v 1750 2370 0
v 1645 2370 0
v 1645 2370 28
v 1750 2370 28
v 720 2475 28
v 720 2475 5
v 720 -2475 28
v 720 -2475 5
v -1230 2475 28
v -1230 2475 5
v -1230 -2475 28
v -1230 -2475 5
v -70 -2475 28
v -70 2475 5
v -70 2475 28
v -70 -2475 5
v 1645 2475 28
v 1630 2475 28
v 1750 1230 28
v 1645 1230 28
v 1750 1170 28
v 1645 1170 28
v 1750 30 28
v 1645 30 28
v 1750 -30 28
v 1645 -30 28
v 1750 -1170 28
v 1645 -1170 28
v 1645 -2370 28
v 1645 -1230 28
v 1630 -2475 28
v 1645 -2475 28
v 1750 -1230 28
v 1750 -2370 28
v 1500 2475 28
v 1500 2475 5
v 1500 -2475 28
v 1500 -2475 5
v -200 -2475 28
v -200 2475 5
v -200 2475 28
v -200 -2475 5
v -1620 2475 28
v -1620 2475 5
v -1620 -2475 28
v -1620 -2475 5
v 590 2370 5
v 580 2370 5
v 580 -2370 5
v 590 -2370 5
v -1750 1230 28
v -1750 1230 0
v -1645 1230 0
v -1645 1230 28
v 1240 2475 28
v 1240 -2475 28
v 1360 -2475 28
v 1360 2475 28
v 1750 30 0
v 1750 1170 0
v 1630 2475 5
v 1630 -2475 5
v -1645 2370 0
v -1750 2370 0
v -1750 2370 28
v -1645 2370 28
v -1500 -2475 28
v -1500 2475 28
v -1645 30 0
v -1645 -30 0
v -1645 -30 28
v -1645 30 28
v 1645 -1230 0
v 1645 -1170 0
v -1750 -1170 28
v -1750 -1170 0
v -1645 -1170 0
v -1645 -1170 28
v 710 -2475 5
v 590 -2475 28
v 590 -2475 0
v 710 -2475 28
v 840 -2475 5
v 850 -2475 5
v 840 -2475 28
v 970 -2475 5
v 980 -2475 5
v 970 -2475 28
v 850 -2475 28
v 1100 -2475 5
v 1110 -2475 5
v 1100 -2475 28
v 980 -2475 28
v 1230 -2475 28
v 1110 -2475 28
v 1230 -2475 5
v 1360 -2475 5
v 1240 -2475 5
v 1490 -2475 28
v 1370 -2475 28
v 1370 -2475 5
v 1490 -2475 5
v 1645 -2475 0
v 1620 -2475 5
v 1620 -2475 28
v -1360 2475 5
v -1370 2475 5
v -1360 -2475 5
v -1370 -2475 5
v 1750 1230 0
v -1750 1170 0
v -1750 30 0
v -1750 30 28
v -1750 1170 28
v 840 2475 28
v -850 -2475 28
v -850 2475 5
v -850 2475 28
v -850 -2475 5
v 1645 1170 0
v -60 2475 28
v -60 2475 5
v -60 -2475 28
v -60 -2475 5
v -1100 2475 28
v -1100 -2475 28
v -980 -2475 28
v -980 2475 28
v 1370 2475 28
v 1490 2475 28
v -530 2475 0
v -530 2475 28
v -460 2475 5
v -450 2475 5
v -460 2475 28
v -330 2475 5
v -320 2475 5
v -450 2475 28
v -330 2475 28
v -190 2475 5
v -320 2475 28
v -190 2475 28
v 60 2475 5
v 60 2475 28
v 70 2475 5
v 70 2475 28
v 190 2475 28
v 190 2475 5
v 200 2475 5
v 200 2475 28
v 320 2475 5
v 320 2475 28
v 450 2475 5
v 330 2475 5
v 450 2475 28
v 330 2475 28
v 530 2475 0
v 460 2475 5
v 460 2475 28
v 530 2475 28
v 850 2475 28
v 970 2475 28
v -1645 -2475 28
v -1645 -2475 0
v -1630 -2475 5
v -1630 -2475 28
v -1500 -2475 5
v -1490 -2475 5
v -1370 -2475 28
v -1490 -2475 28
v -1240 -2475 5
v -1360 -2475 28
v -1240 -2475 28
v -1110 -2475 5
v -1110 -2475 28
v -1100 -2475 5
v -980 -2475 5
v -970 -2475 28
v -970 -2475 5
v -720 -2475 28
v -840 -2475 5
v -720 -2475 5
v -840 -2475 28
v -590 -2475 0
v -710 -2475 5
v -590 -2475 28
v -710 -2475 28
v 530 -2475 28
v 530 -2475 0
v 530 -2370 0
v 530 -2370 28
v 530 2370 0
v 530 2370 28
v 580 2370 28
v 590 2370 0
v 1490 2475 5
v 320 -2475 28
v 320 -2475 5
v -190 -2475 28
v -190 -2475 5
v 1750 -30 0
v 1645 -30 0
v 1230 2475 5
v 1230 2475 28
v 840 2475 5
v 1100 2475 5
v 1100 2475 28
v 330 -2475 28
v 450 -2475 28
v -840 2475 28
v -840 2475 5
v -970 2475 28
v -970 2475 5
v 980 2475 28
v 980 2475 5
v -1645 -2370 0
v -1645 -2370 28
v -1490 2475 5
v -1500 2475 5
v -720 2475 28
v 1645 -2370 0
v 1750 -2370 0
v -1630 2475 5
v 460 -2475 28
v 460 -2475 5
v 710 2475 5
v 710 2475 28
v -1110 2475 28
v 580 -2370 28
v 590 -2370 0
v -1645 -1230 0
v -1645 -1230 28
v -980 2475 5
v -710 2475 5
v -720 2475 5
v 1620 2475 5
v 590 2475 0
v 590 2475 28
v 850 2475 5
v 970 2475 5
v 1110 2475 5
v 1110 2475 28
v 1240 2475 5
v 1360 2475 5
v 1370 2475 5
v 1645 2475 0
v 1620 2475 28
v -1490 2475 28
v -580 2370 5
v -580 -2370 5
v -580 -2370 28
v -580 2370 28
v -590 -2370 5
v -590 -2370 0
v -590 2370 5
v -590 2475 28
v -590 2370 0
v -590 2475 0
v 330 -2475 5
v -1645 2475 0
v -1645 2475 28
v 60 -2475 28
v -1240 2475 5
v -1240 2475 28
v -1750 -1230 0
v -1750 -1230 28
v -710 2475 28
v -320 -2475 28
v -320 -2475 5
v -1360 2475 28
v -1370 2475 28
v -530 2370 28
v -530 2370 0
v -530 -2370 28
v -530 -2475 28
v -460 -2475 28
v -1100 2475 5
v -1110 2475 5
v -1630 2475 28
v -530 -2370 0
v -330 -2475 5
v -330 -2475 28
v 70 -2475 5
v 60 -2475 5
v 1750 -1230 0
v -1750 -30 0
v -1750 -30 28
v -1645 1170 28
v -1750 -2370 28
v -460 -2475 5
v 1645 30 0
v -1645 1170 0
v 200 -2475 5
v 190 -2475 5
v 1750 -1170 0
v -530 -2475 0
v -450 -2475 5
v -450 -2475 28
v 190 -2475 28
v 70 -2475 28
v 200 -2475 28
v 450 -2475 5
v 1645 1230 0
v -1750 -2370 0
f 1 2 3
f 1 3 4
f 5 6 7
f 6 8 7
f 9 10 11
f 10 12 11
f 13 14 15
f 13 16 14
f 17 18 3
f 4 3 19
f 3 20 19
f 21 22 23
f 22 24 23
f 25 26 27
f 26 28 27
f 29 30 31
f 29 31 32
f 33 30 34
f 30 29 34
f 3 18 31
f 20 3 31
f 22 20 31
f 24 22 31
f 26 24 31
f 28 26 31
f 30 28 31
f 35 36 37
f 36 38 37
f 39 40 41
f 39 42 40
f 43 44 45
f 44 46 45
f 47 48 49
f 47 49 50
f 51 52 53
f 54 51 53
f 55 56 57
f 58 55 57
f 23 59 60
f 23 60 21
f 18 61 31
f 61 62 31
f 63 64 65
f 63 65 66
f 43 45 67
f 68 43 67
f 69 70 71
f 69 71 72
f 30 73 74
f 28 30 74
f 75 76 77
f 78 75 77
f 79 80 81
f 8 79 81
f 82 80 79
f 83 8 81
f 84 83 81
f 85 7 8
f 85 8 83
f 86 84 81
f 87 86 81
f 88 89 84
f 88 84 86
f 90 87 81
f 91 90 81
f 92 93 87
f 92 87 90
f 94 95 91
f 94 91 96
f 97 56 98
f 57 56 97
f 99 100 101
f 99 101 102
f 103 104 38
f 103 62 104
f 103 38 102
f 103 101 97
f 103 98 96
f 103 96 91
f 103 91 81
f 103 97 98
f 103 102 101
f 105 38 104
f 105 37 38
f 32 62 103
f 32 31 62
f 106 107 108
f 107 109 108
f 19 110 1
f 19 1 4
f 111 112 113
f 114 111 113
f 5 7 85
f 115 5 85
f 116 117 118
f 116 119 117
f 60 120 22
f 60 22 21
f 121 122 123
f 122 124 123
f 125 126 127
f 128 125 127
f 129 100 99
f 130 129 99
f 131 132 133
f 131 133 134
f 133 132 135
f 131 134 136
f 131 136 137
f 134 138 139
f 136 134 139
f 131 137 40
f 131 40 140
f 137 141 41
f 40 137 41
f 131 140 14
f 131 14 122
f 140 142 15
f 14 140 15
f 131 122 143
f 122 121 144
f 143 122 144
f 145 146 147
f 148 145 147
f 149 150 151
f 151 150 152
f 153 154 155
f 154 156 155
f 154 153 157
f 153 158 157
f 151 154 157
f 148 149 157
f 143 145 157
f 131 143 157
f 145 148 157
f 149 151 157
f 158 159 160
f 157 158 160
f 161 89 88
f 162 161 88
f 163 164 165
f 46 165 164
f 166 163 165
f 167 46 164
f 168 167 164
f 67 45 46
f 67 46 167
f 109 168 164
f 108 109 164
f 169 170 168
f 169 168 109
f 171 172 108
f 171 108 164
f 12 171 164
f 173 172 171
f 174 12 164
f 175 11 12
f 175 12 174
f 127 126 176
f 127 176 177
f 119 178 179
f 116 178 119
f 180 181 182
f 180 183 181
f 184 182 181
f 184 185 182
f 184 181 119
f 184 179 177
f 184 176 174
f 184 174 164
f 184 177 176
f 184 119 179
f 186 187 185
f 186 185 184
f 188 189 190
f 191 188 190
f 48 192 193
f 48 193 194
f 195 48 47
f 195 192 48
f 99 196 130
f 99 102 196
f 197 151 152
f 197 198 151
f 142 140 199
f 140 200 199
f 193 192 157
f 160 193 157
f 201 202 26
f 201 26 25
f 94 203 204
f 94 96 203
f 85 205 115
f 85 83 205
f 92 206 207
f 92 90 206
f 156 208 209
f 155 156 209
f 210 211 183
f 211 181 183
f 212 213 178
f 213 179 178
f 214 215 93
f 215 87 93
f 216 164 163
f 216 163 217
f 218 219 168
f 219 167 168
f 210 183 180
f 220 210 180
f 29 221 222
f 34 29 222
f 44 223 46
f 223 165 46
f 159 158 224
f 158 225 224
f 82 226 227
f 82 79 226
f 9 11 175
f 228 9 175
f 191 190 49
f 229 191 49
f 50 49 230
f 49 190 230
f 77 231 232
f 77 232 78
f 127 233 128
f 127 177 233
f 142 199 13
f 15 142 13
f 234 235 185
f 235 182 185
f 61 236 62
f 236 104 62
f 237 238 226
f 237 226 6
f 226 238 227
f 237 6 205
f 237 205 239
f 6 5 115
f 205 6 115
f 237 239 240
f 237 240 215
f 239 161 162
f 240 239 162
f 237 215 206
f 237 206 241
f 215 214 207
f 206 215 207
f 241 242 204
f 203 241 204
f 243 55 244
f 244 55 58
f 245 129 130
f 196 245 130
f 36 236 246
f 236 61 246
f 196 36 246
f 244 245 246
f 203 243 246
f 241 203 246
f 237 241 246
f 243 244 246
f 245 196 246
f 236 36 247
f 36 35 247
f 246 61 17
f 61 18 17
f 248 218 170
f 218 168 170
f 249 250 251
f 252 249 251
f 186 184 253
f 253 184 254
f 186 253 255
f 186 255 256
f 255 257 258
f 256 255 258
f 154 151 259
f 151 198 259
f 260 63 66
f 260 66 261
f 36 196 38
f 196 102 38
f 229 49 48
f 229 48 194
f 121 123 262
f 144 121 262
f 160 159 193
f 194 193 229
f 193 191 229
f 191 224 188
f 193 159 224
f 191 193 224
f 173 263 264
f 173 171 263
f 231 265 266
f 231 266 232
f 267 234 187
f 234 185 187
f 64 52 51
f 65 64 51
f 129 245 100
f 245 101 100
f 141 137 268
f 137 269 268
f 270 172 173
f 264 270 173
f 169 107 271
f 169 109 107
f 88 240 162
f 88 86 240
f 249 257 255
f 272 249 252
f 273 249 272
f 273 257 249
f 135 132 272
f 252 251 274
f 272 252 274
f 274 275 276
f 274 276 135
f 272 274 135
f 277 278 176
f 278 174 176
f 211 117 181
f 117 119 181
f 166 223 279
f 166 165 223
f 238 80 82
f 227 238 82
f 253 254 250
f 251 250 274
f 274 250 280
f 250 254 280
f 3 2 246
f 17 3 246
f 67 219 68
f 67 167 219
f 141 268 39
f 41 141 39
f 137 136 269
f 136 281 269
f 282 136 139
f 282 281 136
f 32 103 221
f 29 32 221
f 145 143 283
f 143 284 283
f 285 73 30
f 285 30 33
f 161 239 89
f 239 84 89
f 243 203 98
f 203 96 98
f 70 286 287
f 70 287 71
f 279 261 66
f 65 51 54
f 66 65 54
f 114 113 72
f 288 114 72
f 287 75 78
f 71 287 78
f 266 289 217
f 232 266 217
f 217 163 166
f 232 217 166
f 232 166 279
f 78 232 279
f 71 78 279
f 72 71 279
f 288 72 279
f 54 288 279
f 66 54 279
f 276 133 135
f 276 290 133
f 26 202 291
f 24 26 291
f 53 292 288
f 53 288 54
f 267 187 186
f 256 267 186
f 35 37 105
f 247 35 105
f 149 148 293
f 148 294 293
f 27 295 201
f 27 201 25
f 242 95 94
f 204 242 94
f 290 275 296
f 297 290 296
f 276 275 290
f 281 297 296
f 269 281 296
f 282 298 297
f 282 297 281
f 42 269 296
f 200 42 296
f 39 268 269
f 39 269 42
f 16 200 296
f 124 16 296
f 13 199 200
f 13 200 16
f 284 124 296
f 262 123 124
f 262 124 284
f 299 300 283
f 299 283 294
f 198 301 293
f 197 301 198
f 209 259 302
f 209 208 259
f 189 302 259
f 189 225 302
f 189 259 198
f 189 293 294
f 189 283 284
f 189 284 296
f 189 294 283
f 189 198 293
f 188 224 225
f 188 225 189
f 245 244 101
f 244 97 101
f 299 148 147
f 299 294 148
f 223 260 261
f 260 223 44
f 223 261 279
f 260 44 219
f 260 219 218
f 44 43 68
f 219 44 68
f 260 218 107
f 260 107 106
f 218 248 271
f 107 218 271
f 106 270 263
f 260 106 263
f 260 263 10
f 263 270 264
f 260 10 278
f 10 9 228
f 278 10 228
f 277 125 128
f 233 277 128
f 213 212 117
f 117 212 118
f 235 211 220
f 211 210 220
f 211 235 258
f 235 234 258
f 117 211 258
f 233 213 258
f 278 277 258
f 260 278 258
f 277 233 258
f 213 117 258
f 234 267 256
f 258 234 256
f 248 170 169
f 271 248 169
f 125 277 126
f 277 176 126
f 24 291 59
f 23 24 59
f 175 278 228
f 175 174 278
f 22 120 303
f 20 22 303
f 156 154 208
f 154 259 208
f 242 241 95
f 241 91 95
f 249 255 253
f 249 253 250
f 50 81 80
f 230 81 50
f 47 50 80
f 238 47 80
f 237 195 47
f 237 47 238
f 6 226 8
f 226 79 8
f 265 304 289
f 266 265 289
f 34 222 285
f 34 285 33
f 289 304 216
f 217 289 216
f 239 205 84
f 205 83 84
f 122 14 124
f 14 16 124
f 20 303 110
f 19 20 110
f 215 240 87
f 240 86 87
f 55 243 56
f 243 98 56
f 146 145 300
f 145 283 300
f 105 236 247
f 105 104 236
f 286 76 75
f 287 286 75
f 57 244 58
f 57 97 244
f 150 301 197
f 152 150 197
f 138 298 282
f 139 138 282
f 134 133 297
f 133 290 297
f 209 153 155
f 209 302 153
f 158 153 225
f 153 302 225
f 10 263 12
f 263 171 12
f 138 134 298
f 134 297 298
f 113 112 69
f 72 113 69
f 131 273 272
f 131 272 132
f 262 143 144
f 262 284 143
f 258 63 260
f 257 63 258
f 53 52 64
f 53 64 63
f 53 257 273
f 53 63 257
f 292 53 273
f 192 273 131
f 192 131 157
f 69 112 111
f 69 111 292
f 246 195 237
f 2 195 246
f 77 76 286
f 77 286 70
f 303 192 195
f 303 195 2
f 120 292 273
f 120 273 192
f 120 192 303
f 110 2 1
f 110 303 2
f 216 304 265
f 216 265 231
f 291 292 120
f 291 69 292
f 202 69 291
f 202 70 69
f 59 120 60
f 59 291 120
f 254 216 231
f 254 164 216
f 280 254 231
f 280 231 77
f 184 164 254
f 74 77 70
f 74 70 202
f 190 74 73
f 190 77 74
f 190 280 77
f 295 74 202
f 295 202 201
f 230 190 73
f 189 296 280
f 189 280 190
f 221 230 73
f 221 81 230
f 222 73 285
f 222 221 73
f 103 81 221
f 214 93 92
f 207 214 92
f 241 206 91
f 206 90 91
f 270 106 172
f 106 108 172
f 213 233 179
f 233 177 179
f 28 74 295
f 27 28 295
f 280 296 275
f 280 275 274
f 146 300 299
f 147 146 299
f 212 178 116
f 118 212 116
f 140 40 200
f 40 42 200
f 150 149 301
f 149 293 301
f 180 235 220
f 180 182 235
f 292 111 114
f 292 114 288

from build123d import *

# Parameters (mm, degrees)
F0_W          = 3500
F0_H          = 28
F1_DEPTH      = 2475
F2_W          = 10
F2_H          = 23
F3_DEPTH      = 2475
F3_DEPTH_BACK = 2475
F4_W          = 105
F4_H          = 105
F4_W_2        = 60
F4_H_2        = 60
F5_DEPTH      = 28


with BuildPart() as f1:
    # F0 (on Front) → F1 (new body, symmetric)
    with BuildSketch(Plane.XZ):
        with Locations((0, 14)):
            Rectangle(F0_W, F0_H)
    extrude(amount=F1_DEPTH, both=True)

    # F2 (on Front) → F3 (cut, two sides)
    with BuildSketch(Plane.XZ) as f3_sk:
        with Locations((-1625, 16.5)):
            Rectangle(F2_W, F2_H)
        with Locations((-1495, 16.5)):
            Rectangle(F2_W, F2_H)
        with Locations((-1365, 16.5)):
            Rectangle(F2_W, F2_H)
        with Locations((-1235, 16.5)):
            Rectangle(F2_W, F2_H)
        with Locations((-1105, 16.5)):
            Rectangle(F2_W, F2_H)
        with Locations((-975, 16.5)):
            Rectangle(F2_W, F2_H)
        with Locations((-845, 16.5)):
            Rectangle(F2_W, F2_H)
        with Locations((-715, 16.5)):
            Rectangle(F2_W, F2_H)
        with Locations((-585, 16.5)):
            Rectangle(F2_W, F2_H)
        with Locations((-455, 16.5)):
            Rectangle(F2_W, F2_H)
        with Locations((-325, 16.5)):
            Rectangle(F2_W, F2_H)
        with Locations((-195, 16.5)):
            Rectangle(F2_W, F2_H)
        with Locations((-65, 16.5)):
            Rectangle(F2_W, F2_H)
        with Locations((65, 16.5)):
            Rectangle(F2_W, F2_H)
        with Locations((195, 16.5)):
            Rectangle(F2_W, F2_H)
        with Locations((325, 16.5)):
            Rectangle(F2_W, F2_H)
        with Locations((455, 16.5)):
            Rectangle(F2_W, F2_H)
        with Locations((585, 16.5)):
            Rectangle(F2_W, F2_H)
        with Locations((715, 16.5)):
            Rectangle(F2_W, F2_H)
        with Locations((845, 16.5)):
            Rectangle(F2_W, F2_H)
        with Locations((975, 16.5)):
            Rectangle(F2_W, F2_H)
        with Locations((1105, 16.5)):
            Rectangle(F2_W, F2_H)
        with Locations((1235, 16.5)):
            Rectangle(F2_W, F2_H)
        with Locations((1365, 16.5)):
            Rectangle(F2_W, F2_H)
        with Locations((1495, 16.5)):
            Rectangle(F2_W, F2_H)
        with Locations((1625, 16.5)):
            Rectangle(F2_W, F2_H)
    extrude(amount=-F3_DEPTH, mode=Mode.SUBTRACT)
    extrude(f3_sk.sketch, amount=F3_DEPTH_BACK, mode=Mode.SUBTRACT)

    # F4 (on Top) → F5 (cut, through all)
    with BuildSketch(Plane.XY):
        with Locations((-1697.5, -2422.5)):
            Rectangle(F4_W, F4_H)
        with Locations((1697.5, -2422.5)):
            Rectangle(F4_W, F4_H)
        with Locations((1697.5, 2422.5)):
            Rectangle(F4_W, F4_H)
        with Locations((-1697.5, 2422.5)):
            Rectangle(F4_W, F4_H)
        with Locations((-560, -2422.5)):
            Rectangle(F4_W_2, F4_H)
        with Locations((560, -2422.5)):
            Rectangle(F4_W_2, F4_H)
        with Locations((-560, 2422.5)):
            Rectangle(F4_W_2, F4_H)
        with Locations((560, 2422.5)):
            Rectangle(F4_W_2, F4_H)
        with Locations((-1697.5, -1200)):
            Rectangle(F4_W, F4_H_2)
        with Locations((-1697.5, 0)):
            Rectangle(F4_W, F4_H_2)
        with Locations((-1697.5, 1200)):
            Rectangle(F4_W, F4_H_2)
        with Locations((1697.5, 1200)):
            Rectangle(F4_W, F4_H_2)
        with Locations((1697.5, 0)):
            Rectangle(F4_W, F4_H_2)
        with Locations((1697.5, -1200)):
            Rectangle(F4_W, F4_H_2)
    extrude(amount=F5_DEPTH, mode=Mode.SUBTRACT)


solid = f1.part
